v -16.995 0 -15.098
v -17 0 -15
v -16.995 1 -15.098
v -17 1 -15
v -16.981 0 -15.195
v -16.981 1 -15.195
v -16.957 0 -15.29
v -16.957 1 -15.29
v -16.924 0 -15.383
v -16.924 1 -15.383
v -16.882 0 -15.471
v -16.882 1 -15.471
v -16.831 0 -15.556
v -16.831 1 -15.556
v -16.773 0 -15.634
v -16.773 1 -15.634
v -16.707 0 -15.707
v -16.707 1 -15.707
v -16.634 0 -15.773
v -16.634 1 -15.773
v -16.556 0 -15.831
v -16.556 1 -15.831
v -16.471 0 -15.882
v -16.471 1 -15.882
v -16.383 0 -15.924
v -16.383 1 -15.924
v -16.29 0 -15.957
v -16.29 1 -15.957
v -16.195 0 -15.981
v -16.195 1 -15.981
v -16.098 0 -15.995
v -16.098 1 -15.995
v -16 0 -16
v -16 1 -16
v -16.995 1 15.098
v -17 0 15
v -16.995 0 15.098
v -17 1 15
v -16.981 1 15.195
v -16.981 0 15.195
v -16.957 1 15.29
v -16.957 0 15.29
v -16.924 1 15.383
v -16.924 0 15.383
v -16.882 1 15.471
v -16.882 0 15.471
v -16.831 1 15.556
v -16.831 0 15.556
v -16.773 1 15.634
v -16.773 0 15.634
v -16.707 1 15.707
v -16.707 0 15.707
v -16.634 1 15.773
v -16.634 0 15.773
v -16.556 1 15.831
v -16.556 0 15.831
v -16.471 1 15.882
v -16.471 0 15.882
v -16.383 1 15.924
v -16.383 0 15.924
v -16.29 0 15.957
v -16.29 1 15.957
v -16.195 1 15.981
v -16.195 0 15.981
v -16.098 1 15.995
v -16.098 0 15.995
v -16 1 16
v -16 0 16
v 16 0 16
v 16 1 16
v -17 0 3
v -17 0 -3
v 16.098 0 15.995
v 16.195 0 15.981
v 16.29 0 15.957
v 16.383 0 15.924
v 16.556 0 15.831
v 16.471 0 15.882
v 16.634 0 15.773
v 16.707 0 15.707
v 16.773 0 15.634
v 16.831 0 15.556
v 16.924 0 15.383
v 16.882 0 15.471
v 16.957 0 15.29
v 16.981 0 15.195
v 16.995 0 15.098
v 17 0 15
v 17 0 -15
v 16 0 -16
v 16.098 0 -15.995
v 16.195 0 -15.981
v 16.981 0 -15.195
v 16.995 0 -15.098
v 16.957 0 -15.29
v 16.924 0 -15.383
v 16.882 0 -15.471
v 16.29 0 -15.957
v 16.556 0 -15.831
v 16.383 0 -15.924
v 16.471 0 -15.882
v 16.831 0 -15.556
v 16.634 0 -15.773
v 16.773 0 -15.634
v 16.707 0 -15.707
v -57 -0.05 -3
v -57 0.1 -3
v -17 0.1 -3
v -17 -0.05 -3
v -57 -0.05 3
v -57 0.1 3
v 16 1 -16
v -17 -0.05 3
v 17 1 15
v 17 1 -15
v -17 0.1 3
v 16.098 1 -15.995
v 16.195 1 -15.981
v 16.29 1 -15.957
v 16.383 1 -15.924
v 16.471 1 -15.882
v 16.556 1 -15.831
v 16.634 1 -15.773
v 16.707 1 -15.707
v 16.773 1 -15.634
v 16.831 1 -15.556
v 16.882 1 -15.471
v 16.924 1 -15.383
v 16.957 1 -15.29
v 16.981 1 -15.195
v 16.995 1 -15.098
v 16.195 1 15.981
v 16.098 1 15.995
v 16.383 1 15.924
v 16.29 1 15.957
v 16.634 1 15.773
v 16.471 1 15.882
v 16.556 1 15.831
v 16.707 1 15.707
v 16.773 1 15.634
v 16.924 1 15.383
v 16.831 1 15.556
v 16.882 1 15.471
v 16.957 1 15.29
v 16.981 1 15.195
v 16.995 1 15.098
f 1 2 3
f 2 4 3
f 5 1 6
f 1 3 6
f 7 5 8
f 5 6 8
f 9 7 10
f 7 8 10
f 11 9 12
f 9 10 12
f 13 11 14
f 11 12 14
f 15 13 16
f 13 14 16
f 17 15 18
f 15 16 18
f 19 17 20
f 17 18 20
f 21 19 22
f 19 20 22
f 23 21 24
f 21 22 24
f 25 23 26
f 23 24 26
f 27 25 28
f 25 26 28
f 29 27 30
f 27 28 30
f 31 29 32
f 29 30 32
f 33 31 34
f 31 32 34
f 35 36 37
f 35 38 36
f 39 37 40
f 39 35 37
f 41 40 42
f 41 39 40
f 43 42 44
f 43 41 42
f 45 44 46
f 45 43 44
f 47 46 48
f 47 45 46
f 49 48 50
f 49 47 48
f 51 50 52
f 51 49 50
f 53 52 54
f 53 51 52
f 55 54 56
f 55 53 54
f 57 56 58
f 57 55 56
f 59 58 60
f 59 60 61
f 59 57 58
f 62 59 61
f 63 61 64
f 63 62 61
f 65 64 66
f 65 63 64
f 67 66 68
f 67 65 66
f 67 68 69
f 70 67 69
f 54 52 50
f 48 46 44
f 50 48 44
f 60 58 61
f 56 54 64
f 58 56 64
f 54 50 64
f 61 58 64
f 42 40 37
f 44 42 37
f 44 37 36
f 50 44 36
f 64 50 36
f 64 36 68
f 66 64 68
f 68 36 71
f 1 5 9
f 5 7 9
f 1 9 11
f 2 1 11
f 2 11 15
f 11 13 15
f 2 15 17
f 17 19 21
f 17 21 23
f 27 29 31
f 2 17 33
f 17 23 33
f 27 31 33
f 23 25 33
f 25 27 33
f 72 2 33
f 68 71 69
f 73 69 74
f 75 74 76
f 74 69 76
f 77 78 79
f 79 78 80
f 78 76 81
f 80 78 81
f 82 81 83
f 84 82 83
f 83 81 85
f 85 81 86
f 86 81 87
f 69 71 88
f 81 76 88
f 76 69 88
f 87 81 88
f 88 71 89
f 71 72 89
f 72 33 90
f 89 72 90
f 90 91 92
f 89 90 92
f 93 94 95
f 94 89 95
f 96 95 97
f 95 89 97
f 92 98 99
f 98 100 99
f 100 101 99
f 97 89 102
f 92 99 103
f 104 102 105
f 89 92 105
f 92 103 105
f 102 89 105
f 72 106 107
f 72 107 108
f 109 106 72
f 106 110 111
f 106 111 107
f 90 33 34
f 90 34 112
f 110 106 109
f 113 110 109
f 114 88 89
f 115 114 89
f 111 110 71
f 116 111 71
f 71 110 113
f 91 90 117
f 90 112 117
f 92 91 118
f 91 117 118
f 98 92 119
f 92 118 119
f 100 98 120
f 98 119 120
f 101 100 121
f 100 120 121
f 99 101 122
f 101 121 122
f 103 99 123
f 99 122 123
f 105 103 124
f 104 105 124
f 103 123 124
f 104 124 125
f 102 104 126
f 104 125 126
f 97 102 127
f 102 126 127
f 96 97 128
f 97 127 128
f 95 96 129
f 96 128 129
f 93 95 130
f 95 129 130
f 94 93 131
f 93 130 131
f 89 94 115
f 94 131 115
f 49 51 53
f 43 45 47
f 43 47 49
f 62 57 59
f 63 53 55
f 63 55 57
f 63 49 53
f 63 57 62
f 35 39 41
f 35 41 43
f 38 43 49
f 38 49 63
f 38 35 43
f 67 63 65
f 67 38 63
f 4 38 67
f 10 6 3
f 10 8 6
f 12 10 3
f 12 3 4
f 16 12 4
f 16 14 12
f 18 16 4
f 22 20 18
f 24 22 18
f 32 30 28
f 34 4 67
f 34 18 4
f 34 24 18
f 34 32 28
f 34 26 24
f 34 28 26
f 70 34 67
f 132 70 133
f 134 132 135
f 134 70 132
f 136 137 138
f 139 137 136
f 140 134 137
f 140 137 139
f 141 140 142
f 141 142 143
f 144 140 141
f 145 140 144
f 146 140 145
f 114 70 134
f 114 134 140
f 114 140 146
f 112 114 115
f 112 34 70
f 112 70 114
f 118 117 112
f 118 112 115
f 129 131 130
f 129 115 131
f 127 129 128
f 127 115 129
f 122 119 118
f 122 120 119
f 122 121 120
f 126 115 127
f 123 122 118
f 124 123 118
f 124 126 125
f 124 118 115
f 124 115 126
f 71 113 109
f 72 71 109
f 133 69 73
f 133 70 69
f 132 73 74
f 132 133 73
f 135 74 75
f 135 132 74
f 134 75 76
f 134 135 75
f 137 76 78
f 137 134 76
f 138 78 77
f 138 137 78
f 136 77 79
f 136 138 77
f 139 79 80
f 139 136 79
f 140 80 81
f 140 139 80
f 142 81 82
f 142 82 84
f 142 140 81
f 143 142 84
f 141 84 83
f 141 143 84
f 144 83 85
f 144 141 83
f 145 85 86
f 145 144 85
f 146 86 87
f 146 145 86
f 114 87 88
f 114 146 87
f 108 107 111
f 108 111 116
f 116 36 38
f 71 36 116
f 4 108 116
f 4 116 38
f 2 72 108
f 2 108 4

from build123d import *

# Parameters (mm, degrees)
SKETCH_1_W           = 34
SKETCH_1_H           = 32
EXTRUDE_1_DEPTH      = 1
EXTRUDE_2_DEPTH      = 0.1
EXTRUDE_2_DEPTH_BACK = 0.05
SKETCH_2_W           = 40
SKETCH_2_H           = 6
FILLET_1_R           = 1


with BuildPart() as part:
    # 草圖1 → 填料-伸長1 (new body)
    with BuildSketch(Plane(origin=(0, 0, 0), x_dir=(1, 0, 0), z_dir=(0, 1, 0))):
        Rectangle(SKETCH_1_W, SKETCH_1_H)
    extrude(amount=EXTRUDE_1_DEPTH)

    # 草圖2 → 填料-伸長2 (add, two sides: drawn at the far end of the back side and taken through both)
    with BuildSketch(Plane(origin=(0, 0, 0), x_dir=(1, 0, 0), z_dir=(0, 1, 0)).offset(-EXTRUDE_2_DEPTH_BACK)):
        with Locations((-37, 0)):
            Rectangle(SKETCH_2_W, SKETCH_2_H)
    extrude(amount=EXTRUDE_2_DEPTH + EXTRUDE_2_DEPTH_BACK)

    # 圓角1
    fillet_1_edges = [part.edges().sort_by_distance(p)[0] for p in [
        (-17, 0.5, -16),
        (17, 0.5, -16),
        (17, 0.5, 16),
        (-17, 0.5, 16),
    ]]
    fillet(fillet_1_edges, radius=FILLET_1_R)


solid = part.part
